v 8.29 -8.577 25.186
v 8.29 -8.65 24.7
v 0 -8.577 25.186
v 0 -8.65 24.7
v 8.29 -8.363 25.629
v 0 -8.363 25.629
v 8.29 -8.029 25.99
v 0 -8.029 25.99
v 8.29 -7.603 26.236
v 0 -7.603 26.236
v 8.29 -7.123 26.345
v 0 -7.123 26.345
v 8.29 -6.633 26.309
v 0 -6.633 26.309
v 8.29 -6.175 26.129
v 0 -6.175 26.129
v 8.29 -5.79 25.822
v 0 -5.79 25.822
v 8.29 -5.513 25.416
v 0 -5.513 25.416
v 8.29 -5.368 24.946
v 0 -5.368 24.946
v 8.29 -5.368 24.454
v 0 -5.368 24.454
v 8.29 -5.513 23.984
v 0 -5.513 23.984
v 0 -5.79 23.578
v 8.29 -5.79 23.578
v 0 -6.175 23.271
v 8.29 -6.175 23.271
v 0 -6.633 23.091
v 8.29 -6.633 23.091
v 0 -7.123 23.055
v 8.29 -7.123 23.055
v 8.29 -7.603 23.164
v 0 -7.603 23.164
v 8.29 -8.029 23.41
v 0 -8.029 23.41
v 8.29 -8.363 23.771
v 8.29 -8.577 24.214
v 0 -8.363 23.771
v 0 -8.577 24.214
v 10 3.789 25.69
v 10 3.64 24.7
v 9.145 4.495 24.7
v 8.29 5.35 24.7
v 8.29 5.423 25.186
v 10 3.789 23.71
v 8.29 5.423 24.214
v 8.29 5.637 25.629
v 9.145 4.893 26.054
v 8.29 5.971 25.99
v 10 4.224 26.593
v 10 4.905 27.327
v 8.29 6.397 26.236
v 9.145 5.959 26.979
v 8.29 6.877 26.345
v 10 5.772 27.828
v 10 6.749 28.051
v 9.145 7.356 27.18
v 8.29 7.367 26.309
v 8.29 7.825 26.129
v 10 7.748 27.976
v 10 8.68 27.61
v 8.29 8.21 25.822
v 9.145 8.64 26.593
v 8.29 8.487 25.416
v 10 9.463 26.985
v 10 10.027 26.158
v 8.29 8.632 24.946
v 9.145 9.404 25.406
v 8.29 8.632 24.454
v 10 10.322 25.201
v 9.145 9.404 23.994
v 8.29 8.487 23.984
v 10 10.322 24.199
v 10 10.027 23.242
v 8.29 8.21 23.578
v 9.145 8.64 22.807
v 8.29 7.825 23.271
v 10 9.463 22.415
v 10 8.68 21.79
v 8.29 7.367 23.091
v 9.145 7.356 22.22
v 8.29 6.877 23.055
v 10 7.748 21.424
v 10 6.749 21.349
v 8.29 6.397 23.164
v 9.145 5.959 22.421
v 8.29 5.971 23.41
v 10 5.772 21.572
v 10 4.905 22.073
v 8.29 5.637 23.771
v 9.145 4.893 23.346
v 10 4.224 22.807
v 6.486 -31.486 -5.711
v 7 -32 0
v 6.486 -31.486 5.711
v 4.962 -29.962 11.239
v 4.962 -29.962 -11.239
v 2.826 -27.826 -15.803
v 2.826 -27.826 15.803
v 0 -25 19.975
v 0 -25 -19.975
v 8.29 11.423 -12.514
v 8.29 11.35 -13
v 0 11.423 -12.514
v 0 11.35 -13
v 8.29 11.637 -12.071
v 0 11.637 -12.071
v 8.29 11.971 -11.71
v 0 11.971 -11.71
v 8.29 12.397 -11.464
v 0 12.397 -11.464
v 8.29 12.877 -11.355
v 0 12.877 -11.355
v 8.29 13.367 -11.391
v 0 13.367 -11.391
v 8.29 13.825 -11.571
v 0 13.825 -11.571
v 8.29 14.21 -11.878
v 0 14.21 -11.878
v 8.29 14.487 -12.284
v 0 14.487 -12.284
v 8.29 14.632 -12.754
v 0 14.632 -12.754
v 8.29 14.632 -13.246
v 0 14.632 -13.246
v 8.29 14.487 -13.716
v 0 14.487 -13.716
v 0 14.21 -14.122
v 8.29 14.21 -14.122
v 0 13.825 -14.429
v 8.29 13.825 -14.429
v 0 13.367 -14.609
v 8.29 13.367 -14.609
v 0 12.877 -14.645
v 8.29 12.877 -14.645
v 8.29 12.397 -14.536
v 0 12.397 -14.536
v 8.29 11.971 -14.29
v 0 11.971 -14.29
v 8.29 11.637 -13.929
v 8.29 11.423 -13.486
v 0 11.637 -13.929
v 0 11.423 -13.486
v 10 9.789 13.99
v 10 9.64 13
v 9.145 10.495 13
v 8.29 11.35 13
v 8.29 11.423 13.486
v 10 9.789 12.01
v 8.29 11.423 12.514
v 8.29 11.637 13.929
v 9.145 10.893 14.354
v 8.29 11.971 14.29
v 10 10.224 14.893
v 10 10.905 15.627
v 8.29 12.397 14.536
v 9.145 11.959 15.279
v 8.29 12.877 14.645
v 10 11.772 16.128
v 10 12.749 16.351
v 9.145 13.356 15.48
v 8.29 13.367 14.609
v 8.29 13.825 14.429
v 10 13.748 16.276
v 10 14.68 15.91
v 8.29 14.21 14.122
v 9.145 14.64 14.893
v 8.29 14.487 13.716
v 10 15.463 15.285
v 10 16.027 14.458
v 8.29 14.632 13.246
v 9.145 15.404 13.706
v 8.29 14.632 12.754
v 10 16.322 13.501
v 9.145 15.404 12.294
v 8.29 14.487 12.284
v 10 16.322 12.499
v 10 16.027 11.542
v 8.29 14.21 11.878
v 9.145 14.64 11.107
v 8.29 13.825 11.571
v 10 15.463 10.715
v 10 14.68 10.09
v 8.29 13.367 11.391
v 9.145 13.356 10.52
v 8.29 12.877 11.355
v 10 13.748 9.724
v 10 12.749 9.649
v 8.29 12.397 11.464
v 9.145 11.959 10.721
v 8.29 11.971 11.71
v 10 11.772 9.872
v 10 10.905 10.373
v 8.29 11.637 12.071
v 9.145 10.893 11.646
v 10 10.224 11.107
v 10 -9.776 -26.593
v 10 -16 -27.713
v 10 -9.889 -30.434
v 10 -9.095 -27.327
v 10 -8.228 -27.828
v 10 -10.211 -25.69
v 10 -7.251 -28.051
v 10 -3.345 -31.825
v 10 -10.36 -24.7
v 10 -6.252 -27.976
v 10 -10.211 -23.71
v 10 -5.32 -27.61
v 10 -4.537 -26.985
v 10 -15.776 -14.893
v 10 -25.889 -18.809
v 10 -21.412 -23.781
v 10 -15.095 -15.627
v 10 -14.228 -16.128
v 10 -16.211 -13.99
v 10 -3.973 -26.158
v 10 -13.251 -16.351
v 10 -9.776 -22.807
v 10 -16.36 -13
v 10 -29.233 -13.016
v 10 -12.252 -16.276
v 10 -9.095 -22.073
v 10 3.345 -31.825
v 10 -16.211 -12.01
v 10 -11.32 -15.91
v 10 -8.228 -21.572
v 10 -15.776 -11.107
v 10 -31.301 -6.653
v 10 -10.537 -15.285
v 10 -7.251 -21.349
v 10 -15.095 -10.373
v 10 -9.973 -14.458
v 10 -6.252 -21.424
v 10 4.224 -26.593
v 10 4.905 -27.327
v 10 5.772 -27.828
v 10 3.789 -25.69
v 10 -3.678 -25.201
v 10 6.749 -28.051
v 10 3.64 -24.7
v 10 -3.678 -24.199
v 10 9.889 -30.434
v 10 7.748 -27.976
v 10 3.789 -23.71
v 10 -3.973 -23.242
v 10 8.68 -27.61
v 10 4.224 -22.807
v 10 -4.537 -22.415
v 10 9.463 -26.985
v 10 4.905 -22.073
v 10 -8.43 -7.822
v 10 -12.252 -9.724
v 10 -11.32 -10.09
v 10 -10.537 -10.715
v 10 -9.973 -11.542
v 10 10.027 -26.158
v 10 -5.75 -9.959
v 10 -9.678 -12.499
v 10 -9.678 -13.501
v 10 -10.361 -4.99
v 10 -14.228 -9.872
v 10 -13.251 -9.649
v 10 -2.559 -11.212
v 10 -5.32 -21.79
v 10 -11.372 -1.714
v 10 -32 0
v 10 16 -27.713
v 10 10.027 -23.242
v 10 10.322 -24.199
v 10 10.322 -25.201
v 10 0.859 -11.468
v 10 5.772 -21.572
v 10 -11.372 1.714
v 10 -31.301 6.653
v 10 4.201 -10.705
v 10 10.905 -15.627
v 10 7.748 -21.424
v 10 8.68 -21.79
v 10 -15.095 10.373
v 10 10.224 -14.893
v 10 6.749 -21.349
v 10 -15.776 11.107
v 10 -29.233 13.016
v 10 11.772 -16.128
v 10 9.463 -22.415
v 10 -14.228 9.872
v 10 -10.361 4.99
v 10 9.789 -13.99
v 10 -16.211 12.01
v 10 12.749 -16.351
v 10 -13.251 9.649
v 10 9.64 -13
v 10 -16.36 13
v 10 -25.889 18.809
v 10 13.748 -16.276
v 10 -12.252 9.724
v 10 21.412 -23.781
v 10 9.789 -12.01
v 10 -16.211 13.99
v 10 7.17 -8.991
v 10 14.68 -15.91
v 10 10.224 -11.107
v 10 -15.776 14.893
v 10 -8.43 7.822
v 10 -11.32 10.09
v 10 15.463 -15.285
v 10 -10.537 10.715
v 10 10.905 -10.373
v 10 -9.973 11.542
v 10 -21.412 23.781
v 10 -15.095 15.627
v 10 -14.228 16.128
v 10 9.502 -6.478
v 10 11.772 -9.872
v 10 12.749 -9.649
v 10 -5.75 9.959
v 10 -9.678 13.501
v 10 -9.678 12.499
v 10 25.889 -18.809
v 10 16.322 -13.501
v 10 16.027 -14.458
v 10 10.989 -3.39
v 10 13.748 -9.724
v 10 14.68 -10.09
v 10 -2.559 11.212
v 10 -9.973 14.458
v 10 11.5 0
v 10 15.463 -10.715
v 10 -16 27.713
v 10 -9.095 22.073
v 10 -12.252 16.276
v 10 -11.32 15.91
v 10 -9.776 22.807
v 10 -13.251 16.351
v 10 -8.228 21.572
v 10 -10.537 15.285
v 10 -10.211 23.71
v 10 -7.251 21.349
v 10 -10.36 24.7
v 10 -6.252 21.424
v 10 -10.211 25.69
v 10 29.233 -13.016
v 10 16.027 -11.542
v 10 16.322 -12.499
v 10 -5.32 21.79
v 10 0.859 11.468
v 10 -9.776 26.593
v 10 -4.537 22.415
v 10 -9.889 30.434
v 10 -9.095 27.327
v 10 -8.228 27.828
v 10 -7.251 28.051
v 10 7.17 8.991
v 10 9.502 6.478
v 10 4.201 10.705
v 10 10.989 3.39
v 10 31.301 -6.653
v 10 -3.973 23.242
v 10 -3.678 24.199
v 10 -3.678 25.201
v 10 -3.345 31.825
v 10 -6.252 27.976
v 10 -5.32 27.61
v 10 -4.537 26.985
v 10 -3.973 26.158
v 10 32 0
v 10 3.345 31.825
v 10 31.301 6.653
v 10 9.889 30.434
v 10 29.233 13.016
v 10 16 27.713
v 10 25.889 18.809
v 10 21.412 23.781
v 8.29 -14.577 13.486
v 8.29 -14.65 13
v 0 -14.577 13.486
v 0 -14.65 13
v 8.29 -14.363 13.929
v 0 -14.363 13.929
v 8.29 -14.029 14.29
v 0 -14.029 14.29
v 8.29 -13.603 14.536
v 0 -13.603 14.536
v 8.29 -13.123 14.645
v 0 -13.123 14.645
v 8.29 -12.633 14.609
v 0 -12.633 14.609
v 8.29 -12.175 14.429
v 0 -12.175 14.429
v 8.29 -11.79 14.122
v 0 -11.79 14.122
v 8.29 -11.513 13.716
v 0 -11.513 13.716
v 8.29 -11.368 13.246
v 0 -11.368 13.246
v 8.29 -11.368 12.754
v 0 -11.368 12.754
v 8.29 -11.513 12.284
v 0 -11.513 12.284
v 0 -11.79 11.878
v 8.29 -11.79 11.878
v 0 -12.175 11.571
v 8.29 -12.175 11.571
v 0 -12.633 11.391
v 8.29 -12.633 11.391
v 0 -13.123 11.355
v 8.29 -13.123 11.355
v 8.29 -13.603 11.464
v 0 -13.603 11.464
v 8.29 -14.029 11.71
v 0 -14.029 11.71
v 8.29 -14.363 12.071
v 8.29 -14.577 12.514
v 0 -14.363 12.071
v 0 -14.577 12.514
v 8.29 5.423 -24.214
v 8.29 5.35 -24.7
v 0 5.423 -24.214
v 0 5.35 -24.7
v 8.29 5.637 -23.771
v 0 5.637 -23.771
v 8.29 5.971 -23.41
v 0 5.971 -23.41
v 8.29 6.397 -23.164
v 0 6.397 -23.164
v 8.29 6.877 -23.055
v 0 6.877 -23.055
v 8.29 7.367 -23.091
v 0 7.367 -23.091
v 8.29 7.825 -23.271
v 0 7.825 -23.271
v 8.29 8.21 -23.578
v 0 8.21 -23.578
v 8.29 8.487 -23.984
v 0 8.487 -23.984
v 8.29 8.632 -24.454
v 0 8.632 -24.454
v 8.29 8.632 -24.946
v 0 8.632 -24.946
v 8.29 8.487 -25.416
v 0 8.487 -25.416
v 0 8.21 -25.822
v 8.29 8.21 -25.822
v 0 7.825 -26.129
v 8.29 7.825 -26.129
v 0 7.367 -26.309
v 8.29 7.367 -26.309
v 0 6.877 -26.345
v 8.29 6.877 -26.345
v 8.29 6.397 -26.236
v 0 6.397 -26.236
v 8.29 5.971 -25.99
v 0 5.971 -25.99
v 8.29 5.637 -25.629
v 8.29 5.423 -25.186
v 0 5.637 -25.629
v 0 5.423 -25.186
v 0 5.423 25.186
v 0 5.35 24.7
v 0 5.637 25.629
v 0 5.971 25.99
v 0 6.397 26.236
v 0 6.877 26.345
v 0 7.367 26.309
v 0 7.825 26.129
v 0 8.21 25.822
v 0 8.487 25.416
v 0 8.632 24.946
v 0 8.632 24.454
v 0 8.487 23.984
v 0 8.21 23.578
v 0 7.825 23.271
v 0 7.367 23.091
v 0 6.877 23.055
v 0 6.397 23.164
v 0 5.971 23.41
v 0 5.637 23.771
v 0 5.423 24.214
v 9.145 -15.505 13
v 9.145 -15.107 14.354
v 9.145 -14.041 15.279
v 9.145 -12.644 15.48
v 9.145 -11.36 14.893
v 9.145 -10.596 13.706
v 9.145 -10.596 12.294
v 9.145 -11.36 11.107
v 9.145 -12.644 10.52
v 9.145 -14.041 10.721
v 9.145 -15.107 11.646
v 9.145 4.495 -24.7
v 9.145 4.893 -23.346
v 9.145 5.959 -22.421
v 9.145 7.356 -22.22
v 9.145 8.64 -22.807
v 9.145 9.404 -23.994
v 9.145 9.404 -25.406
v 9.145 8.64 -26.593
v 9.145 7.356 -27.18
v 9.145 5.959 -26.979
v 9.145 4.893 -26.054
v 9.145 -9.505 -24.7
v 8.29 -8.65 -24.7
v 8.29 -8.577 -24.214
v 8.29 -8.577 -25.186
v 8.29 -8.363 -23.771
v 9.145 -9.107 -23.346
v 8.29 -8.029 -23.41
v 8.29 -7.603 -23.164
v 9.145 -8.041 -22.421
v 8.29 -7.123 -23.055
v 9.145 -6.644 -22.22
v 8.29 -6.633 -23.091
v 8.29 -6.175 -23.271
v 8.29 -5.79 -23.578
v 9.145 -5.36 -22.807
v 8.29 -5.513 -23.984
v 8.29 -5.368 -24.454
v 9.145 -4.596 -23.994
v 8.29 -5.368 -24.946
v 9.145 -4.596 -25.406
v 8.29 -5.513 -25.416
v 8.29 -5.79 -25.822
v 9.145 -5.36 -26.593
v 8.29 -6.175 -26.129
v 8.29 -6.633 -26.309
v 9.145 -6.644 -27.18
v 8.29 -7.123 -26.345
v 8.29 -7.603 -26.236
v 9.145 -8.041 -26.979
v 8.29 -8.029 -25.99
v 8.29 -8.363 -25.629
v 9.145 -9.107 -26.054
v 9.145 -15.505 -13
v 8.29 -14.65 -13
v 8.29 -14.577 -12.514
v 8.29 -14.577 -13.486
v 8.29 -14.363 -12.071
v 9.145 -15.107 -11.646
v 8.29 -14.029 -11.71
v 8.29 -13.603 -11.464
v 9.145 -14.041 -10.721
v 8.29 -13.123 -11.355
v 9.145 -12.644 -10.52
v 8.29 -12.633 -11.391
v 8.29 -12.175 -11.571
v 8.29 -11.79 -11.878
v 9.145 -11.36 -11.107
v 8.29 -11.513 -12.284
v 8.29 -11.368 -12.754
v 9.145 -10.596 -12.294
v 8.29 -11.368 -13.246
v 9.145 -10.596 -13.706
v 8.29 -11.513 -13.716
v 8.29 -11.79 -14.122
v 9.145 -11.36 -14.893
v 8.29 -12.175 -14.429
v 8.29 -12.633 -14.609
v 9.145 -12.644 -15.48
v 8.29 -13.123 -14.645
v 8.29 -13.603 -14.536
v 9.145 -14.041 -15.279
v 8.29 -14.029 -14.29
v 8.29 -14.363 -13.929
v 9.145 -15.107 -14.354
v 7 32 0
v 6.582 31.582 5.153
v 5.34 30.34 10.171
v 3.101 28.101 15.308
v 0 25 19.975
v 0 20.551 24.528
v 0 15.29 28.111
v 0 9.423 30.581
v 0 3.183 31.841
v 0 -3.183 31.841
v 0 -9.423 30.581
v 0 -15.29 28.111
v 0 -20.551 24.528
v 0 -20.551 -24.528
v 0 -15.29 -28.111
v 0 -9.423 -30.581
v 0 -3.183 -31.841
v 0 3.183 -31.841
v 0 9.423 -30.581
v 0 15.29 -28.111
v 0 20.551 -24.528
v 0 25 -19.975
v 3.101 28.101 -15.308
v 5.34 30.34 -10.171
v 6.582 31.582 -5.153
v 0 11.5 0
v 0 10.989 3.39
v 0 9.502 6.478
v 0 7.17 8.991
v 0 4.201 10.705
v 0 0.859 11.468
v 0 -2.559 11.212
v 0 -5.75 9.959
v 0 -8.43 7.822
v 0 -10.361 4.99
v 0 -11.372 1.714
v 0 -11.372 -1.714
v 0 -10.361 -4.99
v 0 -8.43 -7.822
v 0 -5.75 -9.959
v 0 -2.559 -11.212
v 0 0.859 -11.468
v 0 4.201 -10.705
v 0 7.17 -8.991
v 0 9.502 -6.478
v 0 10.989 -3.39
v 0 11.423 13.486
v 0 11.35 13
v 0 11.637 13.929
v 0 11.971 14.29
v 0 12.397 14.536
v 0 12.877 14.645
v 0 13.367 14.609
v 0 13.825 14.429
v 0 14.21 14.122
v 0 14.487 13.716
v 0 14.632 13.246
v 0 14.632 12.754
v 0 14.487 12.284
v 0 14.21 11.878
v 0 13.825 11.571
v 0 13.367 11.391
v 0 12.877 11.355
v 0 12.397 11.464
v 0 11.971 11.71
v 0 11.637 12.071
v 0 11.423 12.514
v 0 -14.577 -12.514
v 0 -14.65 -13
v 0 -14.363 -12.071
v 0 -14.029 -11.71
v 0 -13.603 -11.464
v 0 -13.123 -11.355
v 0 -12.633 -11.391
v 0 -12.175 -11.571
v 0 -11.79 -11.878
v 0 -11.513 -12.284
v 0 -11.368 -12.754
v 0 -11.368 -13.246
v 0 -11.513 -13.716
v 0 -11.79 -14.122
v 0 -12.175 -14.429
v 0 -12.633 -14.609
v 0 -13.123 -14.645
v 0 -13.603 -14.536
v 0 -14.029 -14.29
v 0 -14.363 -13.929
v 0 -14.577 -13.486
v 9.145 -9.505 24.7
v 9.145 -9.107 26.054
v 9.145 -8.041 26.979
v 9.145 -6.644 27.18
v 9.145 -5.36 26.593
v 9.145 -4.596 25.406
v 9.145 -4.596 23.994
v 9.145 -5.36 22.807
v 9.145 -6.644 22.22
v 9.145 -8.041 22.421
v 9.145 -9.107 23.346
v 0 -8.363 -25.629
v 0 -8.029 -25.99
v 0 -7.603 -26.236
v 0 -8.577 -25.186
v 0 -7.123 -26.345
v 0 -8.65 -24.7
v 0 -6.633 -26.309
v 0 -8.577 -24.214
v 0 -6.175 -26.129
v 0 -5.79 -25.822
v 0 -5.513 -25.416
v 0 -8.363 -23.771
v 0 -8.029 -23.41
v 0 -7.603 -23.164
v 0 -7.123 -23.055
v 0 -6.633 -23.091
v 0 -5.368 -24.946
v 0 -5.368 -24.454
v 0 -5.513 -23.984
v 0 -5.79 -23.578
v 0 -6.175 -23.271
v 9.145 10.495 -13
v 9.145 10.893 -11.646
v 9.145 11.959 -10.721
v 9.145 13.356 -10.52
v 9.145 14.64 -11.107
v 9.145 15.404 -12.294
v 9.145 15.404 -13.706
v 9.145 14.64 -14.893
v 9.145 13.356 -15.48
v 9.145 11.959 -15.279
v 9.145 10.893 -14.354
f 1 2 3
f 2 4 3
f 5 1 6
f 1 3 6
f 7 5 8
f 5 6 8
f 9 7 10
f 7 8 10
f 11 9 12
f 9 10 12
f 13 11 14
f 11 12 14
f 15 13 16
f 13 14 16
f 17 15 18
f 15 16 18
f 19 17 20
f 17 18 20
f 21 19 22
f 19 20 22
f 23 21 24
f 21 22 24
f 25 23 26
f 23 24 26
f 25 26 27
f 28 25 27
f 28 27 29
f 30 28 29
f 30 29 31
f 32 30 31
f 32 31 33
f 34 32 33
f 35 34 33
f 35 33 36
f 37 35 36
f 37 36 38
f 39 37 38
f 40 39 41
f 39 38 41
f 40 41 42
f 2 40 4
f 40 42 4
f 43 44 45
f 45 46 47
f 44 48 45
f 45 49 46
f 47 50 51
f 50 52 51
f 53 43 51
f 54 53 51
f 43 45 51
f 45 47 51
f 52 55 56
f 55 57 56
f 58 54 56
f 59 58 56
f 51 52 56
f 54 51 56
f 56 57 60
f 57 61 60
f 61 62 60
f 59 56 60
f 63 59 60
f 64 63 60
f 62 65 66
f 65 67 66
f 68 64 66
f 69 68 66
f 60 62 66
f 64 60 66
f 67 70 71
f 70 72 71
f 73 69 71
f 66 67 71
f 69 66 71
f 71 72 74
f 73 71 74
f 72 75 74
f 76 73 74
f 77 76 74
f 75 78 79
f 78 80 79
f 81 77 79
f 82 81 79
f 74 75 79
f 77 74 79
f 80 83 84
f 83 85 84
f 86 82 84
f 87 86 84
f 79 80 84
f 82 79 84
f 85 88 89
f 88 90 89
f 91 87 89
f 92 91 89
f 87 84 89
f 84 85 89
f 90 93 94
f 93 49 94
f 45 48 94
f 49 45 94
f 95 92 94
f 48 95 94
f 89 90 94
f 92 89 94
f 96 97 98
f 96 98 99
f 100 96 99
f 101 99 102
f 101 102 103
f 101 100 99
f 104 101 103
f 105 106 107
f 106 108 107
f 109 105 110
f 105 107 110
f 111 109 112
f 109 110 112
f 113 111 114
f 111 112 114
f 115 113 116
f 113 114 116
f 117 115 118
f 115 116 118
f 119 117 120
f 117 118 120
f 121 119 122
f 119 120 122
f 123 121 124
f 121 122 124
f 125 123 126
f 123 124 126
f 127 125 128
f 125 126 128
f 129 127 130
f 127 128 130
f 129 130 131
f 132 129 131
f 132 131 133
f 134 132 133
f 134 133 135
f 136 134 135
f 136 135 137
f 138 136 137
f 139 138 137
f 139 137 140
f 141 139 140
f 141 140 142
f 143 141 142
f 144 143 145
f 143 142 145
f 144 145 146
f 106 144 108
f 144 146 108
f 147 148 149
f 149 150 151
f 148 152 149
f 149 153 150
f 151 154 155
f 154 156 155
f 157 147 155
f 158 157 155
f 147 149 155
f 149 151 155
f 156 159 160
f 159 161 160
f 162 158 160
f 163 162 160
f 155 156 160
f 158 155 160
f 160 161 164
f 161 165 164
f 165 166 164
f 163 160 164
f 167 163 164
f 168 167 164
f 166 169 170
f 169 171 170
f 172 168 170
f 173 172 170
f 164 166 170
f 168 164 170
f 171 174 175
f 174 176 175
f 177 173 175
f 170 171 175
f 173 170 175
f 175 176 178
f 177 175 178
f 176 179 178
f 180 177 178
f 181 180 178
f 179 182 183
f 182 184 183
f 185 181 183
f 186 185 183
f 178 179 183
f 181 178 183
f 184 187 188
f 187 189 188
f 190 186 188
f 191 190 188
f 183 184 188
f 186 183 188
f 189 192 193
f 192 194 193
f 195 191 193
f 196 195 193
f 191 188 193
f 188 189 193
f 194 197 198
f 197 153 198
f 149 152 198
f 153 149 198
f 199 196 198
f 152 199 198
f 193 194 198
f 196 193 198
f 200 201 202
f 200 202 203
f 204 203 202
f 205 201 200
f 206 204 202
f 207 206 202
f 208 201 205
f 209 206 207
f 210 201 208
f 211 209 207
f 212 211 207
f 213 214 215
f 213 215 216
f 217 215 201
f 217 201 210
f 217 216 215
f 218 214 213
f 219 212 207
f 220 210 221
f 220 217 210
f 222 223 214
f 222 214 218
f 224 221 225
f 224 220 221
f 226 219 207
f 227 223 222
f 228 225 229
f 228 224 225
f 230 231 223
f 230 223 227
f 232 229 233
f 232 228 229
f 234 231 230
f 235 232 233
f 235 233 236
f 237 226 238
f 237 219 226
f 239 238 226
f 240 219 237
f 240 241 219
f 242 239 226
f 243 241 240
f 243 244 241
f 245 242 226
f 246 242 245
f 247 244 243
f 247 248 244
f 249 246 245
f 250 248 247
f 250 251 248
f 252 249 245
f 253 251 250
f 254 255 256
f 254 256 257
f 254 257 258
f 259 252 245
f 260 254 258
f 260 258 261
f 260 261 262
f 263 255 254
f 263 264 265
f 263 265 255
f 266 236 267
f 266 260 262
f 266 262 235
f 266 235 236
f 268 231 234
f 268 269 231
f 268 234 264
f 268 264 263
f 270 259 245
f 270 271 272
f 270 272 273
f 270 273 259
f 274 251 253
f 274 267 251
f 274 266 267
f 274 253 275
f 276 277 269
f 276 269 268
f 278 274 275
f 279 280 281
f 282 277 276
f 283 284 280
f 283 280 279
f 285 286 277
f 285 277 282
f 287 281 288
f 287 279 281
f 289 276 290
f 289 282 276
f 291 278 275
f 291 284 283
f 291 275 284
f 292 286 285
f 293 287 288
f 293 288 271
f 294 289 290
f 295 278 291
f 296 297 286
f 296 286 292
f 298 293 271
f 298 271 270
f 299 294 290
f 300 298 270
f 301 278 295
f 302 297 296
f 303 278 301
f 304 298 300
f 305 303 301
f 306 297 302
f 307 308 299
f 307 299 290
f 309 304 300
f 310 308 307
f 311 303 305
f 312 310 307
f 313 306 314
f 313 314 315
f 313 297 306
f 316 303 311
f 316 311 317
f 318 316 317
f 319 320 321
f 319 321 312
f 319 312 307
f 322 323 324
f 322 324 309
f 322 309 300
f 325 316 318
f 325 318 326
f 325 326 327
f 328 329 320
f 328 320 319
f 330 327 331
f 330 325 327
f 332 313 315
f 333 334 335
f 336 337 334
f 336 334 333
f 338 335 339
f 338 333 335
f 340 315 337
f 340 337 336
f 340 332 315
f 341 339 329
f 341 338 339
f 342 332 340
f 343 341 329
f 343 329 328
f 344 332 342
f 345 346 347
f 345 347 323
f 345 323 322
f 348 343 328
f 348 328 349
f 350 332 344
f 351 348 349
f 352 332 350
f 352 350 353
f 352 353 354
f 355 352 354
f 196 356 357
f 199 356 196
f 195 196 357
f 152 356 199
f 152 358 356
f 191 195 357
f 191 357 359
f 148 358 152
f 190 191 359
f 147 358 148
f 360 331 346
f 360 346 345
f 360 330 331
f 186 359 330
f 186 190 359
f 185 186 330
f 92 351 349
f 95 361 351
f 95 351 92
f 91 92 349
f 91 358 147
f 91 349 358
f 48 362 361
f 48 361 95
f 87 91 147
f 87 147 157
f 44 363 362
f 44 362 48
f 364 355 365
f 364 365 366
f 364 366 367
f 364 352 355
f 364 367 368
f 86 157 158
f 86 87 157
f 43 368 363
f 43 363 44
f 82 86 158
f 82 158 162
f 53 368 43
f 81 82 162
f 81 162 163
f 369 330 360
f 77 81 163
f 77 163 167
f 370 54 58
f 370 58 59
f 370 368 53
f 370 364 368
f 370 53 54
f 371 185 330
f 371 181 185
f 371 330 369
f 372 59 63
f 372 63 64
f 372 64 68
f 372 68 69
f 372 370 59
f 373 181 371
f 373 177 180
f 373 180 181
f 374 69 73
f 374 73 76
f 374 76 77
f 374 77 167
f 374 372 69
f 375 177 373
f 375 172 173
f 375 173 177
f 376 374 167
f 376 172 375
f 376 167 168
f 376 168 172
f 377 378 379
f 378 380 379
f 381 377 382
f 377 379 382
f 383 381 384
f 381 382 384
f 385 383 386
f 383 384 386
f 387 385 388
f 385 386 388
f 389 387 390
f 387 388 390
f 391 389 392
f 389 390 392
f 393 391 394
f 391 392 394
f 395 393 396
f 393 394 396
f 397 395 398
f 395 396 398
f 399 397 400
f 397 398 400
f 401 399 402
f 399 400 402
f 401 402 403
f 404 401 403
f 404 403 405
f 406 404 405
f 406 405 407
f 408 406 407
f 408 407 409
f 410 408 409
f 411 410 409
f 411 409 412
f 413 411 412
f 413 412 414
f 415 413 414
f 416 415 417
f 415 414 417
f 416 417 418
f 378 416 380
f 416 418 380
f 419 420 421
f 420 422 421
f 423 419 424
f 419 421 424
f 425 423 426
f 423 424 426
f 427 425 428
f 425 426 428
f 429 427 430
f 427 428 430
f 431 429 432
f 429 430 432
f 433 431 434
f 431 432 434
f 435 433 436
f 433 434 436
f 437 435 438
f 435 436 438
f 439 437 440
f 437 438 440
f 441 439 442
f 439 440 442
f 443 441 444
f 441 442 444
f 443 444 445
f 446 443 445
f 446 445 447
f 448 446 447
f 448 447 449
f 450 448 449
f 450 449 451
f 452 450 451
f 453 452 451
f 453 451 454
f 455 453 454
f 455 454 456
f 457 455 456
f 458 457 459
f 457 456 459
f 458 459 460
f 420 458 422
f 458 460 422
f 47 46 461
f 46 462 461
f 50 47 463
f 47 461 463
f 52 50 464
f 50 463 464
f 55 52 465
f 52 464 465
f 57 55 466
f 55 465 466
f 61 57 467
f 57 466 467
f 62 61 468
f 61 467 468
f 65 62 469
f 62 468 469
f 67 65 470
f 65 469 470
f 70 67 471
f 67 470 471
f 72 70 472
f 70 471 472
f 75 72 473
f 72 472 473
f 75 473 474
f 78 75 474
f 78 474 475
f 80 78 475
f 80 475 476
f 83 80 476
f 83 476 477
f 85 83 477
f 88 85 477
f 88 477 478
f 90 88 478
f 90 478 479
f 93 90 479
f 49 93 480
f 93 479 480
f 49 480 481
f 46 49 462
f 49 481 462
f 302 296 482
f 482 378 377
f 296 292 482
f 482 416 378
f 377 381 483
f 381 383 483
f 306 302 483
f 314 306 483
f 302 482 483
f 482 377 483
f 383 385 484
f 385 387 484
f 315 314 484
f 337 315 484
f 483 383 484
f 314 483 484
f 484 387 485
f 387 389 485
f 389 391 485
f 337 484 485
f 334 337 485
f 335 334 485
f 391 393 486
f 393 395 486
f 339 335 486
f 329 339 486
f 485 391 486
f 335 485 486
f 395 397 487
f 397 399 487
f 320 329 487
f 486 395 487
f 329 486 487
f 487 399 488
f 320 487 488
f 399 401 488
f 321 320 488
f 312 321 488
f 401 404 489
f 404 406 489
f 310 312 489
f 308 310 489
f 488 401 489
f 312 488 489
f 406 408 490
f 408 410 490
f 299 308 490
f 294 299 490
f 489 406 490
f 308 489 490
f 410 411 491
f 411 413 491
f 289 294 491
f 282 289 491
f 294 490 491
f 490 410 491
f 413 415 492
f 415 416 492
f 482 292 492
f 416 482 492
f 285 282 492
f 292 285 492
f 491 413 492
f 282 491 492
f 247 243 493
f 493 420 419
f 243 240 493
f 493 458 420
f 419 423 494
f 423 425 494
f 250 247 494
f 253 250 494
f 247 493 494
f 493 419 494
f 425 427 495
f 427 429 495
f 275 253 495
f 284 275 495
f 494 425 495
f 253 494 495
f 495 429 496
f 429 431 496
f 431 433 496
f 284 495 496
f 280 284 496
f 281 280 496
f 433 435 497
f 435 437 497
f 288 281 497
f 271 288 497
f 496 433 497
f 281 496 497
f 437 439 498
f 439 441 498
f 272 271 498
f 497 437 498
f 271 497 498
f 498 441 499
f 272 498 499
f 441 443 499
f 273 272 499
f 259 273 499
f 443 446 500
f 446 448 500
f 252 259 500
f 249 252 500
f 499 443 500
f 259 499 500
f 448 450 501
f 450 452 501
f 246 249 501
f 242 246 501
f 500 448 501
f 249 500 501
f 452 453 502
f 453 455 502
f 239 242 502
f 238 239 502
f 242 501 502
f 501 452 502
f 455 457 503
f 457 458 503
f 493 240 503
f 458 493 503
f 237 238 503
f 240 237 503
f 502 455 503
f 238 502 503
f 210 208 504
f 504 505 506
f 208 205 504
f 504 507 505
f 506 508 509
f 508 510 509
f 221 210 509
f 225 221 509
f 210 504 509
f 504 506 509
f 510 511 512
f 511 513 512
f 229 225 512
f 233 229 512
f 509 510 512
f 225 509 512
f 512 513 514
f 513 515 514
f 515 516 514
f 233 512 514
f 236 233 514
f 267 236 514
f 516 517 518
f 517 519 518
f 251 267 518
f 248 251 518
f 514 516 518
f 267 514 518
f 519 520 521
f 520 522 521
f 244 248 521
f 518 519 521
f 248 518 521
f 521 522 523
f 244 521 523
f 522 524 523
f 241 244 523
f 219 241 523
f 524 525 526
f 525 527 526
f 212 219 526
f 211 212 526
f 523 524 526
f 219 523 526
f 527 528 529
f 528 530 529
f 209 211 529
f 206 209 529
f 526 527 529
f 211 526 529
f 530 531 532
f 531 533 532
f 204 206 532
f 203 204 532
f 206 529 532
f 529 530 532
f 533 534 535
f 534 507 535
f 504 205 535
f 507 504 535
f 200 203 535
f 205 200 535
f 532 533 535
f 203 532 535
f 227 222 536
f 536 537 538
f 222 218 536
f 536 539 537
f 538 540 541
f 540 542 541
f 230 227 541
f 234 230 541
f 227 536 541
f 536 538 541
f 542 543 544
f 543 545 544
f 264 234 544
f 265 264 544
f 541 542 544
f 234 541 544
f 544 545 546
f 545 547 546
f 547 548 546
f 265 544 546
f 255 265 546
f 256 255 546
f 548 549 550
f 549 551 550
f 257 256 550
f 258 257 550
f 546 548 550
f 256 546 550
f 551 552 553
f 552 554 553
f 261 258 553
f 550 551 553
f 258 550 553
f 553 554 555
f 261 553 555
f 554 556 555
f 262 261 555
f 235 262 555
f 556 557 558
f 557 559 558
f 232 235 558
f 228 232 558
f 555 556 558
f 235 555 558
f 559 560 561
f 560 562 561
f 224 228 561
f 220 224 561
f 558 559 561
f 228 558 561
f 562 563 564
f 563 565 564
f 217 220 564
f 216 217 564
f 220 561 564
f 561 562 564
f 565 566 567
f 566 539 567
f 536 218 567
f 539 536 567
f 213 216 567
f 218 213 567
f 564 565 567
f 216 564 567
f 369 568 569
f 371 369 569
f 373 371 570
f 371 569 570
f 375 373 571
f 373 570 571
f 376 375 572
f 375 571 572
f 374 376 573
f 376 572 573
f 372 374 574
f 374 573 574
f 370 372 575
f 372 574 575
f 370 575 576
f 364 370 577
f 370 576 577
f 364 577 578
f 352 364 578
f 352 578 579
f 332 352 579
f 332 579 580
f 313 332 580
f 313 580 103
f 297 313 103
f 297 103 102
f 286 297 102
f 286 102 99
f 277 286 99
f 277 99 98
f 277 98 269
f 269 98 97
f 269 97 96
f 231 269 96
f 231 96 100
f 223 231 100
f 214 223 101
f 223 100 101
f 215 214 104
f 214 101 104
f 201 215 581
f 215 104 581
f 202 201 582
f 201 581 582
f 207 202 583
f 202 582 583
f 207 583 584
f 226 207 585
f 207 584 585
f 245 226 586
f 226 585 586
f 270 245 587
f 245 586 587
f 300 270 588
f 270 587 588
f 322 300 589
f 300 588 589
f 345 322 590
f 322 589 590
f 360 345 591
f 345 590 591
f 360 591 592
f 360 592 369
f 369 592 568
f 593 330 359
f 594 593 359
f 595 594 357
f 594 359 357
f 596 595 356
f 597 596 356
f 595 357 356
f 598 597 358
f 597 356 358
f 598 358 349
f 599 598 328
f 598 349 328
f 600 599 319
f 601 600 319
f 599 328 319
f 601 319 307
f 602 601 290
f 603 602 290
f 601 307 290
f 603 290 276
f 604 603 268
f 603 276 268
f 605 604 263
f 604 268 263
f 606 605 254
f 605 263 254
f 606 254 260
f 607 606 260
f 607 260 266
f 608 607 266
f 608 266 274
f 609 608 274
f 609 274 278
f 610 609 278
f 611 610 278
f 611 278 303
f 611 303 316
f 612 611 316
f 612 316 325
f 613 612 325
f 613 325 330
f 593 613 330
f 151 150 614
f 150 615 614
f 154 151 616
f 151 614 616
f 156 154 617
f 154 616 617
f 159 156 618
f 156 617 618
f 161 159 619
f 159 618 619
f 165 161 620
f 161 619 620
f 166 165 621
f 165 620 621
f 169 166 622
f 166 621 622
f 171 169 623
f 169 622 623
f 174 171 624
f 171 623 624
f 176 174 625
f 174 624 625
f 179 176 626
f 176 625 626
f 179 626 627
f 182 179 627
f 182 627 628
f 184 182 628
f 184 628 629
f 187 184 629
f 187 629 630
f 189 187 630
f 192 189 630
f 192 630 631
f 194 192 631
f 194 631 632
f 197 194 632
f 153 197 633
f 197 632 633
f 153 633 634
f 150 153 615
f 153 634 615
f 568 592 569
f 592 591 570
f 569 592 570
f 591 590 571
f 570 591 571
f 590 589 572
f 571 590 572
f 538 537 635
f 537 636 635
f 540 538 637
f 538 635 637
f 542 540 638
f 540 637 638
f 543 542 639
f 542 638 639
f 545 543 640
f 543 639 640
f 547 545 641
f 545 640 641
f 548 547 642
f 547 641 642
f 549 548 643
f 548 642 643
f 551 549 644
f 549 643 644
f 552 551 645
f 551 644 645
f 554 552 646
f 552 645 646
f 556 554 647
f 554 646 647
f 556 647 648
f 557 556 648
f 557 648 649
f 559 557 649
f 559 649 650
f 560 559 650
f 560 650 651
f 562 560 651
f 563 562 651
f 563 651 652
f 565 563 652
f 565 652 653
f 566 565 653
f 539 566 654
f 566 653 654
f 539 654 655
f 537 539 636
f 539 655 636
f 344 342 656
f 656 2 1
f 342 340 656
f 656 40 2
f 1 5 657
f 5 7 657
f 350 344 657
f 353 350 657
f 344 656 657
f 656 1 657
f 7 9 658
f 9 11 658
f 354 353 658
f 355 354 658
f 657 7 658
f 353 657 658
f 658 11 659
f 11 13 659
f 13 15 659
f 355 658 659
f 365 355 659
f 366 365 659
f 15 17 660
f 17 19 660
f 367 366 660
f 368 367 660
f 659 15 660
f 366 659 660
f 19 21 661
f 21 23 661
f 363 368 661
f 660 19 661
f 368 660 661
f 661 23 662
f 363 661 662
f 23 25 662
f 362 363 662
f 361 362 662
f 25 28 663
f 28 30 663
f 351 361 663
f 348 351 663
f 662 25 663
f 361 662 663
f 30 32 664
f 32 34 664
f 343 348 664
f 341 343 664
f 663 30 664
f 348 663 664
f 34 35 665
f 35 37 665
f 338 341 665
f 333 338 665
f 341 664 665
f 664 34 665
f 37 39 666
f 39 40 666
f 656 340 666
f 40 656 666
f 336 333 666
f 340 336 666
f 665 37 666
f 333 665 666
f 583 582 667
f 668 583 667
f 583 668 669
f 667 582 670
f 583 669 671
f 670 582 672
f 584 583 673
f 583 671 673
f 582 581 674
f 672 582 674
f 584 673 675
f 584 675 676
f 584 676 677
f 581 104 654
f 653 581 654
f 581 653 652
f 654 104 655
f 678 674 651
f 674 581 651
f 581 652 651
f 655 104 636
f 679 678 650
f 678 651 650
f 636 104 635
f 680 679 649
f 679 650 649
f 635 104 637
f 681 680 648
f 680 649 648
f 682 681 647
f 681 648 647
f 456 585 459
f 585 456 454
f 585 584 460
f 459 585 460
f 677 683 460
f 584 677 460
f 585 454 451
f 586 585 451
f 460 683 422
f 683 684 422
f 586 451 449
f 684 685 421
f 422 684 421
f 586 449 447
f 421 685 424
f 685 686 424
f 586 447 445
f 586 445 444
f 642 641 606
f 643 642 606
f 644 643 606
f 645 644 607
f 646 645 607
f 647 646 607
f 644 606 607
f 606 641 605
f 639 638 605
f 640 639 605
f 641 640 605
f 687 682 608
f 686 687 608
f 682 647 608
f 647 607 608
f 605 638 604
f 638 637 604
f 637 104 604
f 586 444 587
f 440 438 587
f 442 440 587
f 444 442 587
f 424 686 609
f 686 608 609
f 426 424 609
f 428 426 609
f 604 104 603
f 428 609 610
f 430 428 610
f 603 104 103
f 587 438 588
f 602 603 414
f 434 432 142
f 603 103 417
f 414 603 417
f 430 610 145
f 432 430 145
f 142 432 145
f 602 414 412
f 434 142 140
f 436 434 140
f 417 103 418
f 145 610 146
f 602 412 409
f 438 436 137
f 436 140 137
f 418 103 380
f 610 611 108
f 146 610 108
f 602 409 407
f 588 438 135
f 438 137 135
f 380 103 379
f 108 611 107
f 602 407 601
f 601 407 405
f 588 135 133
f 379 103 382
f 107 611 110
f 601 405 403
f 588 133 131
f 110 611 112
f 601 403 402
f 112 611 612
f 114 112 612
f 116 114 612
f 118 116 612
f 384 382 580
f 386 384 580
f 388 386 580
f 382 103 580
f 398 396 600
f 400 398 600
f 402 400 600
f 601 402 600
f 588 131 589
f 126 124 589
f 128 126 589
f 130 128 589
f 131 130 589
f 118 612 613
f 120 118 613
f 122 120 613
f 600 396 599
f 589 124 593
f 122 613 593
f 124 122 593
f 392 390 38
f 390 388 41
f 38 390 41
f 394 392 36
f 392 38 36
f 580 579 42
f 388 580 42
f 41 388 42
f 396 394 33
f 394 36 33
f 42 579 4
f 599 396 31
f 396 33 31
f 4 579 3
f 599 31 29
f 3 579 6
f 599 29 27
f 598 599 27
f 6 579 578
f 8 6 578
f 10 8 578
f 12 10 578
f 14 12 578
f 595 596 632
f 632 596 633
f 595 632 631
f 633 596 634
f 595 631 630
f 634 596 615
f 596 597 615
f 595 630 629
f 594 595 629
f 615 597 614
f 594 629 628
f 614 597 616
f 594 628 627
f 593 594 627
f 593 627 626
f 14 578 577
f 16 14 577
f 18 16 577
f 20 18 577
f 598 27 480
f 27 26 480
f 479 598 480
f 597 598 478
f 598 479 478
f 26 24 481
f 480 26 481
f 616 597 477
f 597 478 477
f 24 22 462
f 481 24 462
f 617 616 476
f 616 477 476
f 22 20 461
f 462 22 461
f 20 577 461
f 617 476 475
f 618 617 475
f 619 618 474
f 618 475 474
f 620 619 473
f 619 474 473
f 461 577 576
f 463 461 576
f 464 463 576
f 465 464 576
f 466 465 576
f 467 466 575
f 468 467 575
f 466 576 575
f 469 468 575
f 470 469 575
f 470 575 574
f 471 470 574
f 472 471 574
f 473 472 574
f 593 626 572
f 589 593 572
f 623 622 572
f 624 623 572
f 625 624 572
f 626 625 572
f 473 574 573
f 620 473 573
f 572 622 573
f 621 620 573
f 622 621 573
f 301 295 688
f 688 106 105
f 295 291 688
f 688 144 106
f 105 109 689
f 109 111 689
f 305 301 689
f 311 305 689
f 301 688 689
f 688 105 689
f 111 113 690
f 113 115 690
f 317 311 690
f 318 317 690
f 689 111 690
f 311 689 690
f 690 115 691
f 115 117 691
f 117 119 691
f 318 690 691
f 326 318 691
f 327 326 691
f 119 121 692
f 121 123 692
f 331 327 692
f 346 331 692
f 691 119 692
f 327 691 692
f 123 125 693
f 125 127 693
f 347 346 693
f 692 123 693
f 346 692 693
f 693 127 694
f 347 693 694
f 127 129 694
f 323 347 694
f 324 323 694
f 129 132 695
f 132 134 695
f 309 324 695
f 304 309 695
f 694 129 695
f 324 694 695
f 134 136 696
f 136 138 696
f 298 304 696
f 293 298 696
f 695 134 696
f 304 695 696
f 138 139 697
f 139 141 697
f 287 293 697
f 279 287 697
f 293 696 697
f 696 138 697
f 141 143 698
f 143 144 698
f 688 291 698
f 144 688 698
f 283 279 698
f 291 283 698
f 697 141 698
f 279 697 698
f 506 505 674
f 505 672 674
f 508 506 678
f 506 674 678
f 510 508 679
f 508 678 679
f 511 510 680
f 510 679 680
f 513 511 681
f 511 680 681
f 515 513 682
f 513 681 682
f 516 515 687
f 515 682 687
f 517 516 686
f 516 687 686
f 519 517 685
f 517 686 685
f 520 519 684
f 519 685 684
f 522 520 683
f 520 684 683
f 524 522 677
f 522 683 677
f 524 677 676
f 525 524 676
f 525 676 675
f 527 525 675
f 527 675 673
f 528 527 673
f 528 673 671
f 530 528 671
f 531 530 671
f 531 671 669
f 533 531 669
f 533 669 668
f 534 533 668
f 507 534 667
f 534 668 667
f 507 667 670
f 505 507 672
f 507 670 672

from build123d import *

# Parameters (mm, degrees)
F0_R           = 32
F1_DEPTH       = 10
F3_D           = 3.3
F3_CSINK_D     = 6.72
F3_CSINK_ANGLE = 90
F5_D           = 3.3
F5_CSINK_D     = 6.72
F5_CSINK_ANGLE = 90
F6_R           = 11.5
F7_DEPTH       = 10.001
F9_DEPTH       = 32.001
F9_DEPTH_BACK  = 32.001


with BuildPart() as f1:
    # F0 (on Right) → F1 (new body)
    with BuildSketch(Plane.YZ):
        Circle(F0_R)
    extrude(amount=F1_DEPTH)

    # F3 (through all)
    with Locations(Plane.YZ.offset(10)):
        with Locations((-13, 13), (13, 13), (13, -13), (-13, -13)):
            CounterSinkHole(F3_D / 2, F3_CSINK_D / 2, counter_sink_angle=F3_CSINK_ANGLE)

    # F5 (through all)
    with Locations(Plane.YZ.offset(10)):
        with Locations((-7, 24.7), (7, 24.7), (-7, -24.7), (7, -24.7)):
            CounterSinkHole(F5_D / 2, F5_CSINK_D / 2, counter_sink_angle=F5_CSINK_ANGLE)

    # F6 (on face) → F7 (cut, through all)
    with BuildSketch(Plane.YZ.offset(10)):
        Circle(F6_R)
    extrude(amount=-F7_DEPTH, mode=Mode.SUBTRACT)

    # F8 (on Top) → F9 (cut, two sides)
    with BuildSketch(Plane.XY) as f9_sk:
        Polygon((0, -25), (0, -32), (7, -32), align=None)
        Polygon((0, 32), (0, 25), (7, 32), align=None)
    extrude(amount=-F9_DEPTH, mode=Mode.SUBTRACT)
    extrude(f9_sk.sketch, amount=F9_DEPTH_BACK, mode=Mode.SUBTRACT)


solid = f1.part
